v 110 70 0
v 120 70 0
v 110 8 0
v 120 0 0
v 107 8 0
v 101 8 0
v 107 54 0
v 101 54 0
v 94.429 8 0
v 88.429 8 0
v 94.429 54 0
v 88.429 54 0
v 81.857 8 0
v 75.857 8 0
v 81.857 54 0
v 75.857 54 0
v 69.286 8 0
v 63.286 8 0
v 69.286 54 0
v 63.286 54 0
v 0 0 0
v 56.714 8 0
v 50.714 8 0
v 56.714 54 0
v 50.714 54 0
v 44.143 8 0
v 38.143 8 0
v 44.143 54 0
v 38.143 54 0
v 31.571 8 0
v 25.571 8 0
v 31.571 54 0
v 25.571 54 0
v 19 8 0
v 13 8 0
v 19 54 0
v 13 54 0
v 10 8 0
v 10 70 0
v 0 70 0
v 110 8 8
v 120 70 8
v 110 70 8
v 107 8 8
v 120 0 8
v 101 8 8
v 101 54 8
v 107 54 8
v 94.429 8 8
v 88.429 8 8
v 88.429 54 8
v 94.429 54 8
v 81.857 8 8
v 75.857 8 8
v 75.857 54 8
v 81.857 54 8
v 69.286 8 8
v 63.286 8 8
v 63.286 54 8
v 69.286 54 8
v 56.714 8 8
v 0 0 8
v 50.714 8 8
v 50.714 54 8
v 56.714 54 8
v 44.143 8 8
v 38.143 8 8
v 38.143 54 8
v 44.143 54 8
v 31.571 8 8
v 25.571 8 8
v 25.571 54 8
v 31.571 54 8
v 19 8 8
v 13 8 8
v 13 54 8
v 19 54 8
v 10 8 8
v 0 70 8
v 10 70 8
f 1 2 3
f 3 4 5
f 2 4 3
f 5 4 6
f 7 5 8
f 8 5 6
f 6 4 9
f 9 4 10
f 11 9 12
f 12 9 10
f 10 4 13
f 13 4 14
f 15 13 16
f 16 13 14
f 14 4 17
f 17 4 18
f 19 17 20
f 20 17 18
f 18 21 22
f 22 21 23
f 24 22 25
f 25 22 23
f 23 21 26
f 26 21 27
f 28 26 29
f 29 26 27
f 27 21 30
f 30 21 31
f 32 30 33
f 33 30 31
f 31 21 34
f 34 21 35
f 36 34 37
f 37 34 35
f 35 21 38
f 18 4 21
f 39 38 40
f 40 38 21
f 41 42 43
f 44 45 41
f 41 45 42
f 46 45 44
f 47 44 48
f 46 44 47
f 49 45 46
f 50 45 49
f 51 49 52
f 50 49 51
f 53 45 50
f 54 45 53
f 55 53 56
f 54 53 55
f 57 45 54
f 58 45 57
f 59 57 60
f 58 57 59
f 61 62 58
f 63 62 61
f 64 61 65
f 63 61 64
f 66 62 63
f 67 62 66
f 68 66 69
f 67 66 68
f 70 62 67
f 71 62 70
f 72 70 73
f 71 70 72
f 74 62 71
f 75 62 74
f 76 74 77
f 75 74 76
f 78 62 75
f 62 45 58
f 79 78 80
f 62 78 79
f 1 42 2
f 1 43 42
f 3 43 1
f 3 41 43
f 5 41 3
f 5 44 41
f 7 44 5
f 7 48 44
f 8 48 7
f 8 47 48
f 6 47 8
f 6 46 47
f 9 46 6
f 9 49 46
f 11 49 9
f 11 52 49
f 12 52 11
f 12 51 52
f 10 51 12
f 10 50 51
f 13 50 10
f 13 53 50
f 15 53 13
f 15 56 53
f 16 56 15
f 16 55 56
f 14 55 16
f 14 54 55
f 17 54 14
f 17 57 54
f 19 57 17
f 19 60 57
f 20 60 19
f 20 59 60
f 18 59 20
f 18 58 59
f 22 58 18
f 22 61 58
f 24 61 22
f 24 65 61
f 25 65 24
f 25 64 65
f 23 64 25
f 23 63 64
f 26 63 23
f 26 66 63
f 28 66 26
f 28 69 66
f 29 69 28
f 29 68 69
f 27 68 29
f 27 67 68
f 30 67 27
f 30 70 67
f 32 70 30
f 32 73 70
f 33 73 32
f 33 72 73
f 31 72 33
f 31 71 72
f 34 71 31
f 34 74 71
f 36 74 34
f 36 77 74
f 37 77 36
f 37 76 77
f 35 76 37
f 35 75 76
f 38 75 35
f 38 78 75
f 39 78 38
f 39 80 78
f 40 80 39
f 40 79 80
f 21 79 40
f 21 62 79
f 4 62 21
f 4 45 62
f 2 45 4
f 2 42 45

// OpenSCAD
$fn = 32;

// ----------------------------------------------------------------------
// Guard grille: 8 slats over a 120 x 70 mm plate
// ----------------------------------------------------------------------

// --- parameters (mm) ---
profile_height = 8;       // extrusion height
profile_points = 40;      // points of the closed outline

profile = [[0, 0], [120, 0], [120, 70], [110, 70], [110, 8], [107, 8], [107, 54], [101, 54], [101, 8], [94.429, 8], [94.429, 54], [88.429, 54], [88.429, 8], [81.857, 8], [81.857, 54], [75.857, 54], [75.857, 8], [69.286, 8], [69.286, 54], [63.286, 54], [63.286, 8], [56.714, 8], [56.714, 54], [50.714, 54], [50.714, 8], [44.143, 8], [44.143, 54], [38.143, 54], [38.143, 8], [31.571, 8], [31.571, 54], [25.571, 54], [25.571, 8], [19, 8], [19, 54], [13, 54], [13, 8], [10, 8], [10, 70], [0, 70]];  // single closed polygon, 40 points, counter clockwise

// --- the one profile operation ---
linear_extrude(height = profile_height) polygon(points = profile);
